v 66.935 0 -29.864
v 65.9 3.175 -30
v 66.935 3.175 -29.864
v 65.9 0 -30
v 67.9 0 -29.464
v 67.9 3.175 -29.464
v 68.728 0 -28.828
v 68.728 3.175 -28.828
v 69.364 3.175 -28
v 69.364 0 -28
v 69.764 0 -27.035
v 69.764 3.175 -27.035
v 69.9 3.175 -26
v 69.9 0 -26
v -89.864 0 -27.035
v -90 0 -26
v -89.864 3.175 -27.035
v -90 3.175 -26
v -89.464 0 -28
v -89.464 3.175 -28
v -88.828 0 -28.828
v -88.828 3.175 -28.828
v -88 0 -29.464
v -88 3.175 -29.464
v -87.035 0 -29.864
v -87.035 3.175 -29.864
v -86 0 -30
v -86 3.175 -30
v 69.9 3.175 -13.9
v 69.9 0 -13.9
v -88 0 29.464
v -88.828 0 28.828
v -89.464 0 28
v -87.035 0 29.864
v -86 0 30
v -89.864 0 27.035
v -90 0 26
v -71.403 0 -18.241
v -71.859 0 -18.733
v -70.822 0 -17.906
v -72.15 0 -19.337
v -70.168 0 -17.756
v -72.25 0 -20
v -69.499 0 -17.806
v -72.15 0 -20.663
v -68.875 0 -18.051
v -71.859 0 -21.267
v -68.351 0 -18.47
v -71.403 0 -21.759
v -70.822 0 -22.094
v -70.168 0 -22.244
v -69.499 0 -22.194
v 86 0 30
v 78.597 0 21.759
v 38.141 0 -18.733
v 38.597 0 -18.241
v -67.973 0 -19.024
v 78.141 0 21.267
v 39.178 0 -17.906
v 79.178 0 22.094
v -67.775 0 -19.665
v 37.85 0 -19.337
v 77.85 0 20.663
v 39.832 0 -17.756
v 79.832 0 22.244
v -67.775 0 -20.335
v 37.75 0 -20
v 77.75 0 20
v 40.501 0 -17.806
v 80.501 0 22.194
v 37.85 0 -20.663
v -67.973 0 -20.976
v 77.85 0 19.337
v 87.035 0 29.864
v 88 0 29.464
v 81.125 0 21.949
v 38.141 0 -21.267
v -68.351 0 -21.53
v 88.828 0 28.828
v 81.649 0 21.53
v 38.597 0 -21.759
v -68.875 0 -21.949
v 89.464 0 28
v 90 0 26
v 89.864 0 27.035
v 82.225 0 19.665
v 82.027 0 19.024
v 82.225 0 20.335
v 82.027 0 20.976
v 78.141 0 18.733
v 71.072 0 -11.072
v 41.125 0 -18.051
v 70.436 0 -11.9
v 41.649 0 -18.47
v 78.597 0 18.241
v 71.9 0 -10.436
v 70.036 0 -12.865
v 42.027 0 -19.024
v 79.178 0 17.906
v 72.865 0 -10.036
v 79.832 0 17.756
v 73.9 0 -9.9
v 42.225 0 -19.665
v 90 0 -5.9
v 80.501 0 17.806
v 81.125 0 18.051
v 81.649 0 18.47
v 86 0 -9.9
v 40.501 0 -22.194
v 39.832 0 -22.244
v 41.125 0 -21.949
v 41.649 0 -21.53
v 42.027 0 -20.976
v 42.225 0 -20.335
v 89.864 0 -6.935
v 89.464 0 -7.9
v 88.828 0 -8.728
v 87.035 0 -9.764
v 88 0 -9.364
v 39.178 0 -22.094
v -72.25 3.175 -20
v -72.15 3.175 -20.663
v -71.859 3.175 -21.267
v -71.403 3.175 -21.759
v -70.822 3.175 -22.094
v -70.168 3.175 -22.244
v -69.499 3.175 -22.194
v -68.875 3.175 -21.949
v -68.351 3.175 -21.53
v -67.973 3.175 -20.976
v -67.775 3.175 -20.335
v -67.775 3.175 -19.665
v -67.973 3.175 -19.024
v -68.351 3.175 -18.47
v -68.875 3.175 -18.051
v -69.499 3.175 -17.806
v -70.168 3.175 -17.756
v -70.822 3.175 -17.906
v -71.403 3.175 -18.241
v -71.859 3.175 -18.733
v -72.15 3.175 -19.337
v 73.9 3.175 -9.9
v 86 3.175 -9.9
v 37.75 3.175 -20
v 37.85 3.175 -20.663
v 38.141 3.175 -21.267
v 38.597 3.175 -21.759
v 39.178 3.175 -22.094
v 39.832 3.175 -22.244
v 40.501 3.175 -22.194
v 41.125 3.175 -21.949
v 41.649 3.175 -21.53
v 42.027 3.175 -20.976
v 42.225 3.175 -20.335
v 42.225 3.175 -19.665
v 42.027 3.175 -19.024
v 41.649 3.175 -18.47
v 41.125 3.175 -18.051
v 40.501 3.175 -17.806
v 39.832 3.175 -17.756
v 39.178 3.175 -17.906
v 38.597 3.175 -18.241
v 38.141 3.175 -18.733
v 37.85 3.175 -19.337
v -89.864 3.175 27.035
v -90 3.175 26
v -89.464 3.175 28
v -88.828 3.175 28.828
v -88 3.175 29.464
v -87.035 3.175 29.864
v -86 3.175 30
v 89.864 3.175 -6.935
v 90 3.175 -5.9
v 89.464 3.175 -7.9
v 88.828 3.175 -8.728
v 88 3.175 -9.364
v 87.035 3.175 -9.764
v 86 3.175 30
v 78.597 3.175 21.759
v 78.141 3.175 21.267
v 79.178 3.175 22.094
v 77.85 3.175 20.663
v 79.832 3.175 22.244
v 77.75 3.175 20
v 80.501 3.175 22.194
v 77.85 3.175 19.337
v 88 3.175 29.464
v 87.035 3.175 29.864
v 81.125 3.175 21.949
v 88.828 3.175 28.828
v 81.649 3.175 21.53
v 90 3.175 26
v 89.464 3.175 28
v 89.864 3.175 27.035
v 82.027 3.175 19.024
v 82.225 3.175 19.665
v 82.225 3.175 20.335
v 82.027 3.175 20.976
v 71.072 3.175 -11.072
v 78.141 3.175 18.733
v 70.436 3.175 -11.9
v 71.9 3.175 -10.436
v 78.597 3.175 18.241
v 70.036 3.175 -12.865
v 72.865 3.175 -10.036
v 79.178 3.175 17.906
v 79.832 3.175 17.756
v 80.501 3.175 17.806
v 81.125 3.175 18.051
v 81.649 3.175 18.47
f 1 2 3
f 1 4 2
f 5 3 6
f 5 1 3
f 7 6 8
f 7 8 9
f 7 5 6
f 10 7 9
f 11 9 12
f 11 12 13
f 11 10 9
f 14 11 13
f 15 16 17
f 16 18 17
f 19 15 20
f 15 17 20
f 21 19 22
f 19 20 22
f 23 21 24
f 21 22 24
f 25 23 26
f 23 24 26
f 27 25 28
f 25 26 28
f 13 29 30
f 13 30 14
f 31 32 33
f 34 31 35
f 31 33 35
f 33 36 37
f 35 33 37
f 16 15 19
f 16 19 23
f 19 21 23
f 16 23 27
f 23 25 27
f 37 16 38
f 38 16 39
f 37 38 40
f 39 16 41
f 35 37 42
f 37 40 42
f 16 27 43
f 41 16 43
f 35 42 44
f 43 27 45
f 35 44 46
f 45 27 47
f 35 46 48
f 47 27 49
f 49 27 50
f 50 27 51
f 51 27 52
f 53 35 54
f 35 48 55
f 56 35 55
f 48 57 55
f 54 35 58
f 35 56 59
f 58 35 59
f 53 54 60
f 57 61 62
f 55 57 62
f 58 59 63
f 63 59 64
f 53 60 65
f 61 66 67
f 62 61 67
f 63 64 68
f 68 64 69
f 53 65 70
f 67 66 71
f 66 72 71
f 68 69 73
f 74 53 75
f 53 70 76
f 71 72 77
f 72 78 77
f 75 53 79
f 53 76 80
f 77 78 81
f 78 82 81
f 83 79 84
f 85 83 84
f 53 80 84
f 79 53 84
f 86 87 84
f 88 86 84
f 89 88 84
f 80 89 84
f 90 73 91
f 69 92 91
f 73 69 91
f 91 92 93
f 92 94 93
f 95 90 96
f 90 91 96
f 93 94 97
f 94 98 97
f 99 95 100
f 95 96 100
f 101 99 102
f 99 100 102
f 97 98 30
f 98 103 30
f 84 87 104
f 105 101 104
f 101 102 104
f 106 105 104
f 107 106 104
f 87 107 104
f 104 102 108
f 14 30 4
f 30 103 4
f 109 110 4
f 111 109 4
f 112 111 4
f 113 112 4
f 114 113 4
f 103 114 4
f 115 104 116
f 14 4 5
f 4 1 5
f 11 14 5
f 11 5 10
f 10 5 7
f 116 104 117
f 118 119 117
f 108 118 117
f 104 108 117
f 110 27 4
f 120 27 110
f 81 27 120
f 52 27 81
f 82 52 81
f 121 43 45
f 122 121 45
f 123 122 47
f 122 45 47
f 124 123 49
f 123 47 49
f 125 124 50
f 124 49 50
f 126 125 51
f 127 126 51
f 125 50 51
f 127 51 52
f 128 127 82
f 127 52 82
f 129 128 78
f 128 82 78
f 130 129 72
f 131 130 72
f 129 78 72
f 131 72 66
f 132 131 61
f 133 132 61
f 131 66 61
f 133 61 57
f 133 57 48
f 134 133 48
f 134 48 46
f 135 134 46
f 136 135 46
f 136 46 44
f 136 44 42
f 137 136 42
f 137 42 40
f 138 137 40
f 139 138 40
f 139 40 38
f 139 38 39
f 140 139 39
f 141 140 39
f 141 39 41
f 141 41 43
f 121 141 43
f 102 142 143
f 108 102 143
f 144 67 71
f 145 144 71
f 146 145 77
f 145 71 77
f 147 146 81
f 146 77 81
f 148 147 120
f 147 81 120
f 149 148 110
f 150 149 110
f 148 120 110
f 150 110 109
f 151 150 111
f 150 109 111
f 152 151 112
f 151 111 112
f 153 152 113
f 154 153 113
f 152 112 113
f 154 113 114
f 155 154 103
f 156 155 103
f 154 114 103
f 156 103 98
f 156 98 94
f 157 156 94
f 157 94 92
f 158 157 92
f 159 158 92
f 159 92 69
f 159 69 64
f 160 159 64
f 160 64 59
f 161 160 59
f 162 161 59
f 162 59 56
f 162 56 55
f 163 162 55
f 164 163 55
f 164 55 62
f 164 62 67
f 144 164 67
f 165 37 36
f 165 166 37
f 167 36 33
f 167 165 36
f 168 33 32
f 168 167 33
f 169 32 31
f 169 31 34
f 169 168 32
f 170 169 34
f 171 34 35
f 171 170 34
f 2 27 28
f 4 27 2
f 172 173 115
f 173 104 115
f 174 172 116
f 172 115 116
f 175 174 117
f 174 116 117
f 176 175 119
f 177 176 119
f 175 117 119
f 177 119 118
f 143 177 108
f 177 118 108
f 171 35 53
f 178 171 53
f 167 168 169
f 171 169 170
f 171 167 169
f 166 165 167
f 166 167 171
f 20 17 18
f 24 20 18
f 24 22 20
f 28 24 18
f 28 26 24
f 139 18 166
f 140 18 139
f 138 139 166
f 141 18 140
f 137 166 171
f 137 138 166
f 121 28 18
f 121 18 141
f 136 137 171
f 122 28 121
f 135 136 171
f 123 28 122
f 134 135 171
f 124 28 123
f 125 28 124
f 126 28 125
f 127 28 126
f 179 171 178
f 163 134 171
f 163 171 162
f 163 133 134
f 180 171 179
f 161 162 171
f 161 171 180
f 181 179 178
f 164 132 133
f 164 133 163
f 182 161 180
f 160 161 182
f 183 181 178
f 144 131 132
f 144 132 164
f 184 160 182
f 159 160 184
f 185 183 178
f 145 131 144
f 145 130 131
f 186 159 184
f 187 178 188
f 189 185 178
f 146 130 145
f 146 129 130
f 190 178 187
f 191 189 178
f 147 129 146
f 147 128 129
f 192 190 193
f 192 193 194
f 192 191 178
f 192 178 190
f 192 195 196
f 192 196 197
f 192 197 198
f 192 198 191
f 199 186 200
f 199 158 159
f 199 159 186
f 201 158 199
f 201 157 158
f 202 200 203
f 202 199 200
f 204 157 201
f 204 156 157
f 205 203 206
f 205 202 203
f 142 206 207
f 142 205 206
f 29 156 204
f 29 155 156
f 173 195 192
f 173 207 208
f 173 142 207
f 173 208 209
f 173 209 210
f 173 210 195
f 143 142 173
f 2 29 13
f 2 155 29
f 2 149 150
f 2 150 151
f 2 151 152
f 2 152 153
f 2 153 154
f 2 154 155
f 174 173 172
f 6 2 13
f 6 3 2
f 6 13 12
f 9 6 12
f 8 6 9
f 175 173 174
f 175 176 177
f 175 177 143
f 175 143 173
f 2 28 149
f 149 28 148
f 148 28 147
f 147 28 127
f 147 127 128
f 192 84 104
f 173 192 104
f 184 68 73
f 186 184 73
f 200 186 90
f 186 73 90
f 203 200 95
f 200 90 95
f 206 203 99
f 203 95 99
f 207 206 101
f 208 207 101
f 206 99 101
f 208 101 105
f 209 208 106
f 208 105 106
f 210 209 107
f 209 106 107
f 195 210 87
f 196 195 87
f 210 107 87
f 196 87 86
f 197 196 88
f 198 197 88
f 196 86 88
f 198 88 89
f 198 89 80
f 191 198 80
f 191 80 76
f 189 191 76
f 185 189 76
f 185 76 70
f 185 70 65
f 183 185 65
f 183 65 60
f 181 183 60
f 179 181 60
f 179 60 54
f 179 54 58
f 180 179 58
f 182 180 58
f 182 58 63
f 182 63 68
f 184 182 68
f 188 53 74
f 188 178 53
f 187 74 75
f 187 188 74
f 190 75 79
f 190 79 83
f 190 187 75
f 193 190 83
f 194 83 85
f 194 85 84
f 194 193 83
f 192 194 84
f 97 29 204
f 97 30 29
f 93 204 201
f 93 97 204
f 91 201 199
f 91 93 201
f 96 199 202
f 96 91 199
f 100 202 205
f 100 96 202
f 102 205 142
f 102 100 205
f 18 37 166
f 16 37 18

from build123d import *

# Parameters (mm, degrees)
SKETCH1_W               = 180
SKETCH1_H               = 60
BOSS_EXTRUDE1_DEPTH     = 3.175
SKETCH5_W               = 20.1
SKETCH5_H               = 20.1
CUT_EXTRUDE1_DEPTH      = 1
CUT_EXTRUDE1_DEPTH_BACK = 4.175
M4_CLEARANCE_HOLE2_D    = 4.5
FILLET2_R               = 4


with BuildPart() as part:
    # Sketch1 → Boss-Extrude1 (new body)
    with BuildSketch(Plane(origin=(0, 0, 0), x_dir=(1, 0, 0), z_dir=(0, 1, 0))):
        Rectangle(SKETCH1_W, SKETCH1_H)
    extrude(amount=BOSS_EXTRUDE1_DEPTH)

    # Sketch5 → Cut-Extrude1 (cut, two sides)
    with BuildSketch(Plane(origin=(0, 3.175, 0), x_dir=(1, 0, 0), z_dir=(0, 1, 0))) as cut_extrude1_sk:
        with Locations((79.95, 19.95)):
            Rectangle(SKETCH5_W, SKETCH5_H)
    extrude(amount=CUT_EXTRUDE1_DEPTH, mode=Mode.SUBTRACT)
    extrude(cut_extrude1_sk.sketch, amount=-CUT_EXTRUDE1_DEPTH_BACK, mode=Mode.SUBTRACT)

    # M4 Clearance Hole2 (through all)
    with Locations(Plane(origin=(0, 3.175, 0), x_dir=(1, 0, 0), z_dir=(0, 1, 0))):
        with Locations((-70, 20), (40, 20), (80, -20)):
            Hole(M4_CLEARANCE_HOLE2_D / 2)

    # Fillet2
    fillet2_edges = [part.edges().sort_by_distance(p)[0] for p in [
        (69.9, 1.5875, -9.9),
        (69.9, 1.5875, -30),
        (90, 1.5875, -9.9),
        (-90, 1.5875, -30),
        (90, 1.5875, 30),
        (-90, 1.5875, 30),
    ]]
    fillet(fillet2_edges, radius=FILLET2_R)


solid = part.part
